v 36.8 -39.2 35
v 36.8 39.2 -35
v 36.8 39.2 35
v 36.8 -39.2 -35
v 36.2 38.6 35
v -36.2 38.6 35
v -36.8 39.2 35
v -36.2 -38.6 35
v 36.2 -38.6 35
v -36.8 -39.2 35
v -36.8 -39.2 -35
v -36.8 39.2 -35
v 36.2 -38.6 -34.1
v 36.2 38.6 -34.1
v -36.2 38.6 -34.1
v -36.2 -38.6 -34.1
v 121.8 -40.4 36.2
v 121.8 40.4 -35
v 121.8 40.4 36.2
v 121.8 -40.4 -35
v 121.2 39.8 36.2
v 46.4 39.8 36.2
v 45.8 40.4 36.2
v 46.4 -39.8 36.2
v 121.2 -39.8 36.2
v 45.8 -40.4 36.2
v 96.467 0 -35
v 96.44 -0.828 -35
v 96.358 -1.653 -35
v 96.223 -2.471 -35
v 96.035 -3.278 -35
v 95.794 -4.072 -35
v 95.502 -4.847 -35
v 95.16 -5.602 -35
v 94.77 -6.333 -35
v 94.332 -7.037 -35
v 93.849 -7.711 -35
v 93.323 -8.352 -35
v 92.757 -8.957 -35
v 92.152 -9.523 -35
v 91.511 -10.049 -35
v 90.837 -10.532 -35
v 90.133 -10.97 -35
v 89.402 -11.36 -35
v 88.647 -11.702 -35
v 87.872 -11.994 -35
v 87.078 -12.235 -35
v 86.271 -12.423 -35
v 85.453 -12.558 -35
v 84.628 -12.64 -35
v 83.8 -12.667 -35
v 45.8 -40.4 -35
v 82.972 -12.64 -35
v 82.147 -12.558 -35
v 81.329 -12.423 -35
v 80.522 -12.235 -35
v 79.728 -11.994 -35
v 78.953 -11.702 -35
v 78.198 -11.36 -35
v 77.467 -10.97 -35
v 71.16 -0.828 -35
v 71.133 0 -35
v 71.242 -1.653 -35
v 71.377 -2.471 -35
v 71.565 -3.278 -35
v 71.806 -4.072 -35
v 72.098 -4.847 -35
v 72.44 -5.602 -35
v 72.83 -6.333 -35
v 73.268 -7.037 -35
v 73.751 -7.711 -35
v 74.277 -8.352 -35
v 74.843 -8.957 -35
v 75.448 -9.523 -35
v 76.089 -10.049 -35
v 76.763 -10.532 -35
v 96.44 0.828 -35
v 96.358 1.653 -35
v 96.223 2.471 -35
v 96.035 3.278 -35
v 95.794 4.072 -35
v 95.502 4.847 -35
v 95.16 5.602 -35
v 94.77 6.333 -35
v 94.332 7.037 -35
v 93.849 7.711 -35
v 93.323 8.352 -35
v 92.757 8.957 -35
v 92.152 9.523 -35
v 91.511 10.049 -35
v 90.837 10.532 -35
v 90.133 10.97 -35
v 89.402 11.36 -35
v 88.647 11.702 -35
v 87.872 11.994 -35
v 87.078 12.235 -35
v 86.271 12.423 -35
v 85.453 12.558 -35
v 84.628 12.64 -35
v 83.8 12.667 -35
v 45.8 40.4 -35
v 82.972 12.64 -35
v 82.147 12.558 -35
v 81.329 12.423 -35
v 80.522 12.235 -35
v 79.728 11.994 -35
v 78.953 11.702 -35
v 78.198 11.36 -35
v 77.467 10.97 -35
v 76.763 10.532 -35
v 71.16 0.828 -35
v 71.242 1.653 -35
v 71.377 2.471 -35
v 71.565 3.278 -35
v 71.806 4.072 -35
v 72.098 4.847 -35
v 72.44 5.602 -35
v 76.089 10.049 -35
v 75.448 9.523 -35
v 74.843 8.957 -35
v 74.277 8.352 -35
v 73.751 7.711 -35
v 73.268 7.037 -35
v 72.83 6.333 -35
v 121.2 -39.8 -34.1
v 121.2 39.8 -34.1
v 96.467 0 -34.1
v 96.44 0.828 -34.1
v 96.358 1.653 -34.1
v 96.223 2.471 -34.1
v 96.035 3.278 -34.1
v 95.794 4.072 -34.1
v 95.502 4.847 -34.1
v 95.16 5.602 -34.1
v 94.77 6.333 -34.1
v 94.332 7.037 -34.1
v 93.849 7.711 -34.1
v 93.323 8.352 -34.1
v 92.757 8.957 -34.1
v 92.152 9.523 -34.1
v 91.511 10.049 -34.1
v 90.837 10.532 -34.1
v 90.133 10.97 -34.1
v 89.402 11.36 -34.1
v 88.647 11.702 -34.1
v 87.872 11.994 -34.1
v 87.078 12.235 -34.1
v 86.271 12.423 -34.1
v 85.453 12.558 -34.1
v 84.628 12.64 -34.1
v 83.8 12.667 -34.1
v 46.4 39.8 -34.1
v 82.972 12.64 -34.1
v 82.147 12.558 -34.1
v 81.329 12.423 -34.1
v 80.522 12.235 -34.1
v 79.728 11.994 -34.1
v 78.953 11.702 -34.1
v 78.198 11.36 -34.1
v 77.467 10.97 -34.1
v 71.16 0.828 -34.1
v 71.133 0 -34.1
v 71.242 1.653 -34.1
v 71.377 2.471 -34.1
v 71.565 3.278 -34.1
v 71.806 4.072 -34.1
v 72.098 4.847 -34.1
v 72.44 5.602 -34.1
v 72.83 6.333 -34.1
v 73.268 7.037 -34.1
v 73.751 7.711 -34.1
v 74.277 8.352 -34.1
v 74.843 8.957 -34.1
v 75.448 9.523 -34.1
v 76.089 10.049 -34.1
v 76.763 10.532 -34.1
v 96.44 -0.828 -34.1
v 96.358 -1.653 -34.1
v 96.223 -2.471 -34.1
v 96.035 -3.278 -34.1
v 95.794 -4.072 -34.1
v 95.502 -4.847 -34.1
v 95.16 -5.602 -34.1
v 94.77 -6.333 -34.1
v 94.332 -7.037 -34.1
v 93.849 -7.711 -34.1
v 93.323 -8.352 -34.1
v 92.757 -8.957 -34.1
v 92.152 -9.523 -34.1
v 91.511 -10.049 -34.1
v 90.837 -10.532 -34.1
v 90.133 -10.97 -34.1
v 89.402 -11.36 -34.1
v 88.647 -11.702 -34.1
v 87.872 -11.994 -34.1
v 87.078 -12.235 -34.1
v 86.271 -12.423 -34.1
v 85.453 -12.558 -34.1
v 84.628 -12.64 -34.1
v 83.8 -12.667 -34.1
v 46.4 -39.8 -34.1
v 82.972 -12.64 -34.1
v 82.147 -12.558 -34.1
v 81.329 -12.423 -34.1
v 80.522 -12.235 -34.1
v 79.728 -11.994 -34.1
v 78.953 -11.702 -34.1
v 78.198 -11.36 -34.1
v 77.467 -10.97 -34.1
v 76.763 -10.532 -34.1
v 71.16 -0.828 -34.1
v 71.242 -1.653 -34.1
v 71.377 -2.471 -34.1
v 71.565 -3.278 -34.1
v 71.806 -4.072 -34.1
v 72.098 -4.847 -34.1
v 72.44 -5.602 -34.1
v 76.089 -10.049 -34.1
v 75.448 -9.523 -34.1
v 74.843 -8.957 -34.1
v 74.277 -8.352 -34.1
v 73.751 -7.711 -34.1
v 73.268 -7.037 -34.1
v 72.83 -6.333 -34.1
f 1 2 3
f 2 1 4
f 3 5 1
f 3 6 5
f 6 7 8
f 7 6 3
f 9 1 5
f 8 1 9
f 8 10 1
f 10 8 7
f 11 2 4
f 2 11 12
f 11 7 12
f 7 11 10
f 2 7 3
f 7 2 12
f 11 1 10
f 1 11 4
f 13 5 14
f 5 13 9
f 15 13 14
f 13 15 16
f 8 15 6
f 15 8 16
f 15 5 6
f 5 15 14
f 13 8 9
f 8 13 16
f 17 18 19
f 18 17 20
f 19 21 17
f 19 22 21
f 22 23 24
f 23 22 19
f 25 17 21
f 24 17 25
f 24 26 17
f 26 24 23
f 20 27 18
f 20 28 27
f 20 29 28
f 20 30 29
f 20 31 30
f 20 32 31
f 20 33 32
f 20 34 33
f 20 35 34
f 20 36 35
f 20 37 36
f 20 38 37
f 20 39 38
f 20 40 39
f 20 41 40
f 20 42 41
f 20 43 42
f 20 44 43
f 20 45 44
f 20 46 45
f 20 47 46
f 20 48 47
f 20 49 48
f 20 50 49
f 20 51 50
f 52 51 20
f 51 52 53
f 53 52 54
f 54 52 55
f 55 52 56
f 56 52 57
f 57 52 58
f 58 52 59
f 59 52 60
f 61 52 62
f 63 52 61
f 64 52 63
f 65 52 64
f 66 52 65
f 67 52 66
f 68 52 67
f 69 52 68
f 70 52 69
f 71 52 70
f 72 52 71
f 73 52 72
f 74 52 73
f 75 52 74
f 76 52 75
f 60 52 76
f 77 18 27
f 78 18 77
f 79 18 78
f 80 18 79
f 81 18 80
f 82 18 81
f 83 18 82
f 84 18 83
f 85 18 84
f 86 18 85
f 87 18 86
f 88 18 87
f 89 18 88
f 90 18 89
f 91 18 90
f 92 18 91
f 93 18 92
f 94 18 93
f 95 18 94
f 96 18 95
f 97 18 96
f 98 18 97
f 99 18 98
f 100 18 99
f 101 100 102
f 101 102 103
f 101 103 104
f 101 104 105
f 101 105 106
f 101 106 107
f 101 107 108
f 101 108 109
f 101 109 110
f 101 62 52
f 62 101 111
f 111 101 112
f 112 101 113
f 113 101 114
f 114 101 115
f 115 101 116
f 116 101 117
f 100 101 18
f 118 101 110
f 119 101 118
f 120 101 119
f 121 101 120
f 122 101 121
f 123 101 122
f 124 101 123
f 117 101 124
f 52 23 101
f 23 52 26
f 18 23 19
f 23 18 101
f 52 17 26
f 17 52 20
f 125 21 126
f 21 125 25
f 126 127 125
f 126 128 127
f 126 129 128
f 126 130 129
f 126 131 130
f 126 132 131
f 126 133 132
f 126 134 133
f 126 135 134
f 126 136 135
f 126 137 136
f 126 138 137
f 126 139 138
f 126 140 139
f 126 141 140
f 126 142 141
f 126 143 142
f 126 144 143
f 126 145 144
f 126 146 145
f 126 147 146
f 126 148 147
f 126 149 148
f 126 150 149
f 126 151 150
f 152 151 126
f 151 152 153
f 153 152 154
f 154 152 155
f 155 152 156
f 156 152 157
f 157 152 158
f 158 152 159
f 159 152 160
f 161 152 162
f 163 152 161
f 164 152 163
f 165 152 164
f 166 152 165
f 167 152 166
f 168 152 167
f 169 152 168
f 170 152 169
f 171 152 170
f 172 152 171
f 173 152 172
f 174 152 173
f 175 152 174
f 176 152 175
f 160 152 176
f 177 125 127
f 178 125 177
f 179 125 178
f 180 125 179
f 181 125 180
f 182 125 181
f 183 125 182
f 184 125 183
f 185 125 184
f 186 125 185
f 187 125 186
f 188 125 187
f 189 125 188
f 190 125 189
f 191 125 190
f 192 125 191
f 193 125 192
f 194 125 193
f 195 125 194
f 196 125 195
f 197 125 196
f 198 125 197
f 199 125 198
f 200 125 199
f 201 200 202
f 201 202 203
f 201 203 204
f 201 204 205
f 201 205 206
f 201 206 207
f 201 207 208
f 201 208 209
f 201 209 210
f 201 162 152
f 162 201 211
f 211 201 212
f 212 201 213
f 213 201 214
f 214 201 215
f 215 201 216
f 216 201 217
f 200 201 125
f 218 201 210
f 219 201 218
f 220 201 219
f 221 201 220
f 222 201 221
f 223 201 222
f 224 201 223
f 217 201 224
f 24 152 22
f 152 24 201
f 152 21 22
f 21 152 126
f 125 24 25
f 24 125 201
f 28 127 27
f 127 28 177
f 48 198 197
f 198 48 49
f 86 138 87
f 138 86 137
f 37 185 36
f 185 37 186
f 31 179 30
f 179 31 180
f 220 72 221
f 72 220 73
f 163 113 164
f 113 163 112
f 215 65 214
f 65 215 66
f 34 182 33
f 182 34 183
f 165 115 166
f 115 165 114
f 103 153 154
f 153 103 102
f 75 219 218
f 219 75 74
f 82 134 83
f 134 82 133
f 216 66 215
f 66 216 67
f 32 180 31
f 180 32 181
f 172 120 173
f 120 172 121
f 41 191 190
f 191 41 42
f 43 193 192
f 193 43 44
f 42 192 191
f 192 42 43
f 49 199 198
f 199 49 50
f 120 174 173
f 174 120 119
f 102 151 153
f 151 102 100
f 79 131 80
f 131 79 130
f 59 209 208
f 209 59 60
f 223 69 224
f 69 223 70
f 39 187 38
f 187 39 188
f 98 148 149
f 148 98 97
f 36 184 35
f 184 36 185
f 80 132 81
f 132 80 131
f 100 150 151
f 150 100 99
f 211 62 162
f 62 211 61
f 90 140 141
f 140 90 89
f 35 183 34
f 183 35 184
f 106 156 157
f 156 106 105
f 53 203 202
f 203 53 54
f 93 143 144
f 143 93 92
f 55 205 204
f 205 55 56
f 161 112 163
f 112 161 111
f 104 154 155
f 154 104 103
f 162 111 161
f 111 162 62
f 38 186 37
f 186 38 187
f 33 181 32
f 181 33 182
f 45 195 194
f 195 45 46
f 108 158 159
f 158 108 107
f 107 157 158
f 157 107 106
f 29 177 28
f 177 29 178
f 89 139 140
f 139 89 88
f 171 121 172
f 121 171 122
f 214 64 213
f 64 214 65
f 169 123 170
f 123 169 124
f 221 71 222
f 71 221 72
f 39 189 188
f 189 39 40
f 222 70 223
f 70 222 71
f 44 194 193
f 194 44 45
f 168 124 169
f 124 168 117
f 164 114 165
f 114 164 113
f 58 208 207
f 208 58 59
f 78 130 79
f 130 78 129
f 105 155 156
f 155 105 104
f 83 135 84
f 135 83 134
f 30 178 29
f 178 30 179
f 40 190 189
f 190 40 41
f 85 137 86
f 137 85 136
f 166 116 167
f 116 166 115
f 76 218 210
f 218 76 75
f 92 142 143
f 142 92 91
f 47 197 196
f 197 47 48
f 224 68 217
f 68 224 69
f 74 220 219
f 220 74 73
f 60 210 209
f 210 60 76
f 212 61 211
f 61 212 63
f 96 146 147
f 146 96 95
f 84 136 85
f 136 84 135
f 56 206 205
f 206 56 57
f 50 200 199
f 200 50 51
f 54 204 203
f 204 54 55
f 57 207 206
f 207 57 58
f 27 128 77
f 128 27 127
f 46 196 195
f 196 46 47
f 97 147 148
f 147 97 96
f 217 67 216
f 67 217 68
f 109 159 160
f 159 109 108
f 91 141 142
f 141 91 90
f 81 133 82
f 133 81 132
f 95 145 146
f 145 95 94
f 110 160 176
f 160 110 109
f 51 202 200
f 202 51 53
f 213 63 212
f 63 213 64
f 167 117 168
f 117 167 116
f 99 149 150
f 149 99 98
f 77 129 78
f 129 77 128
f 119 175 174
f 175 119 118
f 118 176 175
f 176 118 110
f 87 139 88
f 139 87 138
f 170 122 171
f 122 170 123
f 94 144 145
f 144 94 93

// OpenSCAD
inner_h = 70;
thickness = 0.6;
spacing = 0.6;

function outer_h(inner_h, thickness) = inner_h + thickness;

function inner_w(inner_h, thickness) = outer_h(inner_h, thickness) + 2 * thickness;

function outer_w(inner_h, thickness) = inner_w(inner_h, thickness) + 2 * thickness;

function inner_l(inner_h, thickness) = outer_w(inner_h, thickness) + 2 * thickness;

function outer_l(inner_h, thickness) = inner_l(inner_h, thickness) + 2 * thickness;

module box_without_upper(w, h, l, thickness) {
	difference() {
	    cube([w, l, h], center = true);
	    translate([0, 0, thickness]) 
		    cube([w - 2 * thickness, l - 2 * thickness, h - thickness], center = true);
    }    
}

module inner_box(inner_h, thickness, spacing) {
    w = inner_w(inner_h, thickness + spacing);
	h = inner_h;
	l = inner_l(inner_h, thickness + spacing);
	
	box_without_upper(w, h, l, thickness);
}

module outer_box(inner_h, thickness, spacing) {
    w = outer_w(inner_h, thickness + spacing);
    h = outer_h(inner_h, thickness + spacing);
    l = outer_l(inner_h, thickness + spacing);

    difference() {	
        box_without_upper(w, h, l, thickness);
	    translate([0, 0, -h / 2]) linear_extrude(thickness * 2) circle(w / 6, $fn=96);
	}
}

inner_box(inner_h, thickness, spacing);
translate([inner_w(inner_h, thickness) + 20 * thickness, 0, thickness / 2 + spacing / 2]) 
    outer_box(inner_h, thickness, spacing);
